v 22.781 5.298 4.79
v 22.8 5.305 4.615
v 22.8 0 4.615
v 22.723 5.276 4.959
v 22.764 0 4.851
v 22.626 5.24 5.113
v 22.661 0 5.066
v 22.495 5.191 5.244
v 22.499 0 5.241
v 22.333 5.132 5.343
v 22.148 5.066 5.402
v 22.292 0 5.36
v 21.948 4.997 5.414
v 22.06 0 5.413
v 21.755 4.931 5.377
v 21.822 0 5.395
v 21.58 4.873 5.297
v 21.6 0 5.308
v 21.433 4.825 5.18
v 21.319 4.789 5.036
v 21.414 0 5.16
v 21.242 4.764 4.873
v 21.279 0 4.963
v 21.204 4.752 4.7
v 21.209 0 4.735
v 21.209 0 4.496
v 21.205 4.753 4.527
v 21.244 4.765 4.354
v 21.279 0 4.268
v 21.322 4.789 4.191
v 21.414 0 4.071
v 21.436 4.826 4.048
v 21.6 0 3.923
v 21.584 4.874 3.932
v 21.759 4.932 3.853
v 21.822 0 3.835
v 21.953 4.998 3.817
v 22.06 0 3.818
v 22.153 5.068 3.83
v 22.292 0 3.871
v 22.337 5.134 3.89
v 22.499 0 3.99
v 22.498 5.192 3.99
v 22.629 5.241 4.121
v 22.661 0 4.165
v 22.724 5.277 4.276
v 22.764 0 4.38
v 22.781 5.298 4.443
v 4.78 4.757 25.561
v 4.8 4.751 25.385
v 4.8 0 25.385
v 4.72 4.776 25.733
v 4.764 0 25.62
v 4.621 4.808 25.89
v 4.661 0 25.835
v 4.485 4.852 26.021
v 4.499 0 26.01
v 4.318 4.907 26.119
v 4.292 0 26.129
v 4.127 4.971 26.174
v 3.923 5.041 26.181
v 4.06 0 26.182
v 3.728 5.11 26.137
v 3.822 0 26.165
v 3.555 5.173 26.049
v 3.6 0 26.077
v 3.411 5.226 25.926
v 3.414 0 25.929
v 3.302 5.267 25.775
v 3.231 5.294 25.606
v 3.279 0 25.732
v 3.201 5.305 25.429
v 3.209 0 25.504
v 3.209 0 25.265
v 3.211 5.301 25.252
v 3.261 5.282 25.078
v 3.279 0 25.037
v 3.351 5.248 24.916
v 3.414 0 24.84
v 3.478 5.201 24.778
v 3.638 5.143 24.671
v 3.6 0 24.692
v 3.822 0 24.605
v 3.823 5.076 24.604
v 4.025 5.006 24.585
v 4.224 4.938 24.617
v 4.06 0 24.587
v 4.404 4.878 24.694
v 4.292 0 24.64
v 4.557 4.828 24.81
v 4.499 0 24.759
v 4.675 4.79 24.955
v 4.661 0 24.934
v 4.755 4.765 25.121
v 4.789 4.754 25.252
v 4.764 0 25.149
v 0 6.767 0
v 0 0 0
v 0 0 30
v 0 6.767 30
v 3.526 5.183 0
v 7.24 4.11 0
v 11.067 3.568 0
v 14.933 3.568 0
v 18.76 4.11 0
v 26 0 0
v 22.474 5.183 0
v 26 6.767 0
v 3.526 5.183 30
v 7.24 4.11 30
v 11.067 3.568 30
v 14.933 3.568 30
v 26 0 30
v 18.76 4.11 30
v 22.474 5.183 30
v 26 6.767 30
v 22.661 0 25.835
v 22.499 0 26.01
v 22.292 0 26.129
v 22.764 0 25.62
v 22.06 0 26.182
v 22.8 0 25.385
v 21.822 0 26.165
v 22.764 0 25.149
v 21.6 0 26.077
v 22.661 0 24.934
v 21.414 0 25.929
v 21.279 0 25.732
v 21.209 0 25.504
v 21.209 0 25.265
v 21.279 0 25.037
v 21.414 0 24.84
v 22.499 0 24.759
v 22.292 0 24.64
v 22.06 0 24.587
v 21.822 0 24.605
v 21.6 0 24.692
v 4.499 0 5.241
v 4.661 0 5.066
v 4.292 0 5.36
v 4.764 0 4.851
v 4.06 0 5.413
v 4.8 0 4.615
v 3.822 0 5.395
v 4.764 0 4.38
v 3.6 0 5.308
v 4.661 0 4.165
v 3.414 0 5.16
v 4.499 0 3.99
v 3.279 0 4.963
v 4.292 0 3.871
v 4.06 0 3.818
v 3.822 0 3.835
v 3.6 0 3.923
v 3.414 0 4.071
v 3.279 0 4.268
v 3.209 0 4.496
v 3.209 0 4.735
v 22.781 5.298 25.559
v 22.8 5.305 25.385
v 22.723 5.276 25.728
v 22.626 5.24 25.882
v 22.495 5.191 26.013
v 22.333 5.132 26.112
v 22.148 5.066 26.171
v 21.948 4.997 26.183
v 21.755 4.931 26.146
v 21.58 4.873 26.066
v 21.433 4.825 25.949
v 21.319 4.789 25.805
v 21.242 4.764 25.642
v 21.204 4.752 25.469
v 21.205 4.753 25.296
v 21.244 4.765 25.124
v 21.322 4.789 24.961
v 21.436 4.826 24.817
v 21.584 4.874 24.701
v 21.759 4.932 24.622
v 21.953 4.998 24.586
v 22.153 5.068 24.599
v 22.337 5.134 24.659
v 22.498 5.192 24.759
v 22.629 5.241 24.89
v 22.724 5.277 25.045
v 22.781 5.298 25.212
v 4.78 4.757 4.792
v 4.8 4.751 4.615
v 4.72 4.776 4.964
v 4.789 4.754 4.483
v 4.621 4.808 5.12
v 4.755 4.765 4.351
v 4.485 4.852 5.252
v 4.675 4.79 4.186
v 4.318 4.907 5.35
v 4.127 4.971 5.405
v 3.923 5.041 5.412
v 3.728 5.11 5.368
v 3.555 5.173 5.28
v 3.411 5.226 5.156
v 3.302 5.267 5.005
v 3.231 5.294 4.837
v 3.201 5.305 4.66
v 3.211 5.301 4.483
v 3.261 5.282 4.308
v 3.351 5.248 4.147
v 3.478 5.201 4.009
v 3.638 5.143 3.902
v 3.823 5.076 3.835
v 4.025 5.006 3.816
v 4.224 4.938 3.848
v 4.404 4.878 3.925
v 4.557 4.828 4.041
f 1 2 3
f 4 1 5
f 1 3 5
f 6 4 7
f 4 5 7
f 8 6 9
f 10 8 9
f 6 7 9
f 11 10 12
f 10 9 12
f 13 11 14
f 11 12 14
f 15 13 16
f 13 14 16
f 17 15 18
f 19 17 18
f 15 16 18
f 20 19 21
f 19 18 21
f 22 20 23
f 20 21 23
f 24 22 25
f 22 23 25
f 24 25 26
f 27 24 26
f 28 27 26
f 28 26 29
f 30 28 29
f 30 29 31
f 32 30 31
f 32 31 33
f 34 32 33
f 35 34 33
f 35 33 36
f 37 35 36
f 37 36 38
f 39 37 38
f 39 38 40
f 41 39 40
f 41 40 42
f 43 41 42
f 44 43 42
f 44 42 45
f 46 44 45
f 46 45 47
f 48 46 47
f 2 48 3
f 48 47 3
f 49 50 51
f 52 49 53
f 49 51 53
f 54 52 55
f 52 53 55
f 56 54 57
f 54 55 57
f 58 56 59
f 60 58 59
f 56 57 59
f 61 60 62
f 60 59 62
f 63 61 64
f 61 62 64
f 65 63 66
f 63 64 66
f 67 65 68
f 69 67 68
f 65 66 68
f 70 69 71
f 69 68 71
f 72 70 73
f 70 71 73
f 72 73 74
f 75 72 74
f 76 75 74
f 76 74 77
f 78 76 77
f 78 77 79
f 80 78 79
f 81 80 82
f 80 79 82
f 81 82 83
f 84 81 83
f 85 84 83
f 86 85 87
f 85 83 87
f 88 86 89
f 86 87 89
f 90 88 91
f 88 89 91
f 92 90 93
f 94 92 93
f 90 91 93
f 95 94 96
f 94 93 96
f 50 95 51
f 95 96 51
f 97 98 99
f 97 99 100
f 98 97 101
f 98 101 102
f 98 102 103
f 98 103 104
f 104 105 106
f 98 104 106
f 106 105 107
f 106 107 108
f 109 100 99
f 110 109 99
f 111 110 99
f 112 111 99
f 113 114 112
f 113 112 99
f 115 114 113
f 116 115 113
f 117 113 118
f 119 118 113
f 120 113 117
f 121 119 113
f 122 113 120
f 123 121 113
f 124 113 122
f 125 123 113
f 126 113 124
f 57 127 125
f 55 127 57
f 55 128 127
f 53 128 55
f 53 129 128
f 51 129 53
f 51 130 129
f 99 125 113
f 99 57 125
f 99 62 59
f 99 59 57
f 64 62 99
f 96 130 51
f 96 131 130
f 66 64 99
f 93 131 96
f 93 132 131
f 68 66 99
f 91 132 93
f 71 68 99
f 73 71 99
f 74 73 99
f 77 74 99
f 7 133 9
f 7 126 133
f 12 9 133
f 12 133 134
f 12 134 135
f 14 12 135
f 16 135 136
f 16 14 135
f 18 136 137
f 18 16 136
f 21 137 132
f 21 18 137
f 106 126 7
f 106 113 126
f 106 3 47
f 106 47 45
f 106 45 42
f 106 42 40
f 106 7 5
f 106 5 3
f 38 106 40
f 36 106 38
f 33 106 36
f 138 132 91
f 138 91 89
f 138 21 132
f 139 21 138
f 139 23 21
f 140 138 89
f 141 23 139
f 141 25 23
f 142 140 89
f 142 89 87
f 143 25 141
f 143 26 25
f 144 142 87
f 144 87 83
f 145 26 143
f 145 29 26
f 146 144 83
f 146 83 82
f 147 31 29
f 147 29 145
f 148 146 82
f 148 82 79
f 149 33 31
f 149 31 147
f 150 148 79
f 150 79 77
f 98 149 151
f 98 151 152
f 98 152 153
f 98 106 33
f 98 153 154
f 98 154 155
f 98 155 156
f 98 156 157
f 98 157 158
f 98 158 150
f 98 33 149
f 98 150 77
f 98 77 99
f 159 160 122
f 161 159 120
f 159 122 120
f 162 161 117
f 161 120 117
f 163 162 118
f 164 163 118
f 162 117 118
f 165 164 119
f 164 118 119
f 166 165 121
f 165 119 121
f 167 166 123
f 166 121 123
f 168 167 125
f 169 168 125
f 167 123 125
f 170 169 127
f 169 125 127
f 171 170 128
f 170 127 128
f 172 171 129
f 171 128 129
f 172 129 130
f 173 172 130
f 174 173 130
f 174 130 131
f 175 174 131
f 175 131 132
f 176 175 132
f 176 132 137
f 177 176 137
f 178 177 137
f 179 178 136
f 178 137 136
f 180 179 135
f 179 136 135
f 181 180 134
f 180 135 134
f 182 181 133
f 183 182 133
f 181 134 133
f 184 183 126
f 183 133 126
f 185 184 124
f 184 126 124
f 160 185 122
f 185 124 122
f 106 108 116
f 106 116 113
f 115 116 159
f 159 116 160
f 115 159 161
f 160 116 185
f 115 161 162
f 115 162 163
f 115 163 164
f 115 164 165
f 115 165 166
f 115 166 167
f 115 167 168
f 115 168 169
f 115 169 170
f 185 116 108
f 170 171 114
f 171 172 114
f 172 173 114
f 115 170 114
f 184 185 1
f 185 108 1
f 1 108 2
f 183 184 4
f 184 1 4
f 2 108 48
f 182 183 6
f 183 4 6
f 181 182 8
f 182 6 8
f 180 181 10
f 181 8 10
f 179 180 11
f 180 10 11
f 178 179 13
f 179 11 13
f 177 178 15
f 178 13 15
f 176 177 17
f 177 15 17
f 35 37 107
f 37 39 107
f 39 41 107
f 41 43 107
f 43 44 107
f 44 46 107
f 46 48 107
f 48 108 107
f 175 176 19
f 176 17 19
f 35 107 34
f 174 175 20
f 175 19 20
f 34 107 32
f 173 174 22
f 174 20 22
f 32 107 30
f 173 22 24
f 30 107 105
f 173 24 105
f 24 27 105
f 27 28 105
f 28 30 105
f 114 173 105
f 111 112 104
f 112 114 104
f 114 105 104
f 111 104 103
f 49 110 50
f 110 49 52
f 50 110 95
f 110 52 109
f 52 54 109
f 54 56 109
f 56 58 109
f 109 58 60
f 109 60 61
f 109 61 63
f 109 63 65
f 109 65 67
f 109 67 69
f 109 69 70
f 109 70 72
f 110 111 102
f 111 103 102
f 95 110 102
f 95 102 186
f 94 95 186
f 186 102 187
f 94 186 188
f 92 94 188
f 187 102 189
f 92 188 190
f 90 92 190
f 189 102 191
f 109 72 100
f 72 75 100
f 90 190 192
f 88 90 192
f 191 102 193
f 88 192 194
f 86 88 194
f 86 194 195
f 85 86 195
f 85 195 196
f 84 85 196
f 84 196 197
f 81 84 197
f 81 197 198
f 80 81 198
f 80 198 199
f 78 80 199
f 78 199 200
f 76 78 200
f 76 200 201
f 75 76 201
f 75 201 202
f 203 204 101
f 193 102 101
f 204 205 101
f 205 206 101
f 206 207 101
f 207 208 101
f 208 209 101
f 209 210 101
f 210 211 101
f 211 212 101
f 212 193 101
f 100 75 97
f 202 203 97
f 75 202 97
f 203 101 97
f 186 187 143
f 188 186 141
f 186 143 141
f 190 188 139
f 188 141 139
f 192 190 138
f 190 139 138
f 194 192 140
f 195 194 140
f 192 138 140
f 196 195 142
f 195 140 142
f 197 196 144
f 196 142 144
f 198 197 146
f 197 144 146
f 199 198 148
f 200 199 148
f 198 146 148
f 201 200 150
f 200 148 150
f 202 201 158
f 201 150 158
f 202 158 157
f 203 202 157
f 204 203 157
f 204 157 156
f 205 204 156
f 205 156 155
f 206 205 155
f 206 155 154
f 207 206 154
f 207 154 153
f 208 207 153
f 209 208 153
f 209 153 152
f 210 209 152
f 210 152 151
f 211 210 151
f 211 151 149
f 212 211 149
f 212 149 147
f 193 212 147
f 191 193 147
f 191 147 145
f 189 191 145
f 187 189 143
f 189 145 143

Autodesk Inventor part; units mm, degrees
ref_plane "YZ Plane" through (0, 0, 0) normal (1, 0, 0) x (0, 1, 0)
ref_plane "XZ Plane" through (0, 0, 0) normal (0, 1, 0) x (-1, 0, 0)
ref_plane "XY Plane" through (0, 0, 0) normal (0, 0, 1) x (1, 0, 0)
sketch "スケッチ1" plane through (0, 0, 0) normal (0, 0, 1) x (1, 0, 0)
  line L0 (0, 31) -> (26, 31)
  line L1 (26, 31) -> (26, 0)
  line L2 (26, 0) -> (0, 0)
  line L3 (0, 0) -> (0, 31)
  circle A0 centre (13, 31) radius 27.5
  point P0 (26, 6.7668)
  point P1 (0, 6.7668)
  dimension "d0" = 55
  dimension "d1" = 31
  dimension "d3" = 26
extrude "押し出し1" add sketch "スケッチ1" along normal blind 30 contours A0 L1 L2 L3
sketch "スケッチ2" plane through (0, 0, 0) normal (0, -1, 0) x (1, 0, 0)
  line L0 (26, 0) -> (0, 30)
  line L1 (0, 0) -> (26, 30)
  line L2 (22, 4.6154) -> (4, 4.6154)
  line L3 (4, 4.6154) -> (4, 25.3846)
  line L4 (4, 25.3846) -> (22, 25.3846)
  line L5 (22, 25.3846) -> (22, 4.6154)
  line L6 (26, 0) -> (26, 30) projected
  line L7 (26, 0) -> (0, 0) projected
  line L8 (0, 0) -> (0, 32) projected
  circle A0 centre (22, 4.6154) radius 0.8
  circle A1 centre (4, 4.6154) radius 0.8
  circle A2 centre (4, 25.3846) radius 0.8
  circle A3 centre (22, 25.3846) radius 0.8
  dimension "d6" = 4
  dimension "d7" = 1.6
  dimension "d8" = 1.6
  dimension "d9" = 1.6
  dimension "d10" = 1.6
extrude "押し出し2" cut sketch "スケッチ2" against normal through all contours A0 L2 L0 | L0 L5 A0 | L2 A0 L0 | L0 A0 L5 | A3 L5 L1 | L1 L4 A3 | A1 L3 L1 | L1 L2 A1 | L2 L1 A1 | L5 A3 L1 | L1 A3 L4 | L3 A1 L1 | A2 L4 L0 | L0 L3 A2 | A2 L0 L4 | L3 L0 A2
properties part number "toe_back_buf"
